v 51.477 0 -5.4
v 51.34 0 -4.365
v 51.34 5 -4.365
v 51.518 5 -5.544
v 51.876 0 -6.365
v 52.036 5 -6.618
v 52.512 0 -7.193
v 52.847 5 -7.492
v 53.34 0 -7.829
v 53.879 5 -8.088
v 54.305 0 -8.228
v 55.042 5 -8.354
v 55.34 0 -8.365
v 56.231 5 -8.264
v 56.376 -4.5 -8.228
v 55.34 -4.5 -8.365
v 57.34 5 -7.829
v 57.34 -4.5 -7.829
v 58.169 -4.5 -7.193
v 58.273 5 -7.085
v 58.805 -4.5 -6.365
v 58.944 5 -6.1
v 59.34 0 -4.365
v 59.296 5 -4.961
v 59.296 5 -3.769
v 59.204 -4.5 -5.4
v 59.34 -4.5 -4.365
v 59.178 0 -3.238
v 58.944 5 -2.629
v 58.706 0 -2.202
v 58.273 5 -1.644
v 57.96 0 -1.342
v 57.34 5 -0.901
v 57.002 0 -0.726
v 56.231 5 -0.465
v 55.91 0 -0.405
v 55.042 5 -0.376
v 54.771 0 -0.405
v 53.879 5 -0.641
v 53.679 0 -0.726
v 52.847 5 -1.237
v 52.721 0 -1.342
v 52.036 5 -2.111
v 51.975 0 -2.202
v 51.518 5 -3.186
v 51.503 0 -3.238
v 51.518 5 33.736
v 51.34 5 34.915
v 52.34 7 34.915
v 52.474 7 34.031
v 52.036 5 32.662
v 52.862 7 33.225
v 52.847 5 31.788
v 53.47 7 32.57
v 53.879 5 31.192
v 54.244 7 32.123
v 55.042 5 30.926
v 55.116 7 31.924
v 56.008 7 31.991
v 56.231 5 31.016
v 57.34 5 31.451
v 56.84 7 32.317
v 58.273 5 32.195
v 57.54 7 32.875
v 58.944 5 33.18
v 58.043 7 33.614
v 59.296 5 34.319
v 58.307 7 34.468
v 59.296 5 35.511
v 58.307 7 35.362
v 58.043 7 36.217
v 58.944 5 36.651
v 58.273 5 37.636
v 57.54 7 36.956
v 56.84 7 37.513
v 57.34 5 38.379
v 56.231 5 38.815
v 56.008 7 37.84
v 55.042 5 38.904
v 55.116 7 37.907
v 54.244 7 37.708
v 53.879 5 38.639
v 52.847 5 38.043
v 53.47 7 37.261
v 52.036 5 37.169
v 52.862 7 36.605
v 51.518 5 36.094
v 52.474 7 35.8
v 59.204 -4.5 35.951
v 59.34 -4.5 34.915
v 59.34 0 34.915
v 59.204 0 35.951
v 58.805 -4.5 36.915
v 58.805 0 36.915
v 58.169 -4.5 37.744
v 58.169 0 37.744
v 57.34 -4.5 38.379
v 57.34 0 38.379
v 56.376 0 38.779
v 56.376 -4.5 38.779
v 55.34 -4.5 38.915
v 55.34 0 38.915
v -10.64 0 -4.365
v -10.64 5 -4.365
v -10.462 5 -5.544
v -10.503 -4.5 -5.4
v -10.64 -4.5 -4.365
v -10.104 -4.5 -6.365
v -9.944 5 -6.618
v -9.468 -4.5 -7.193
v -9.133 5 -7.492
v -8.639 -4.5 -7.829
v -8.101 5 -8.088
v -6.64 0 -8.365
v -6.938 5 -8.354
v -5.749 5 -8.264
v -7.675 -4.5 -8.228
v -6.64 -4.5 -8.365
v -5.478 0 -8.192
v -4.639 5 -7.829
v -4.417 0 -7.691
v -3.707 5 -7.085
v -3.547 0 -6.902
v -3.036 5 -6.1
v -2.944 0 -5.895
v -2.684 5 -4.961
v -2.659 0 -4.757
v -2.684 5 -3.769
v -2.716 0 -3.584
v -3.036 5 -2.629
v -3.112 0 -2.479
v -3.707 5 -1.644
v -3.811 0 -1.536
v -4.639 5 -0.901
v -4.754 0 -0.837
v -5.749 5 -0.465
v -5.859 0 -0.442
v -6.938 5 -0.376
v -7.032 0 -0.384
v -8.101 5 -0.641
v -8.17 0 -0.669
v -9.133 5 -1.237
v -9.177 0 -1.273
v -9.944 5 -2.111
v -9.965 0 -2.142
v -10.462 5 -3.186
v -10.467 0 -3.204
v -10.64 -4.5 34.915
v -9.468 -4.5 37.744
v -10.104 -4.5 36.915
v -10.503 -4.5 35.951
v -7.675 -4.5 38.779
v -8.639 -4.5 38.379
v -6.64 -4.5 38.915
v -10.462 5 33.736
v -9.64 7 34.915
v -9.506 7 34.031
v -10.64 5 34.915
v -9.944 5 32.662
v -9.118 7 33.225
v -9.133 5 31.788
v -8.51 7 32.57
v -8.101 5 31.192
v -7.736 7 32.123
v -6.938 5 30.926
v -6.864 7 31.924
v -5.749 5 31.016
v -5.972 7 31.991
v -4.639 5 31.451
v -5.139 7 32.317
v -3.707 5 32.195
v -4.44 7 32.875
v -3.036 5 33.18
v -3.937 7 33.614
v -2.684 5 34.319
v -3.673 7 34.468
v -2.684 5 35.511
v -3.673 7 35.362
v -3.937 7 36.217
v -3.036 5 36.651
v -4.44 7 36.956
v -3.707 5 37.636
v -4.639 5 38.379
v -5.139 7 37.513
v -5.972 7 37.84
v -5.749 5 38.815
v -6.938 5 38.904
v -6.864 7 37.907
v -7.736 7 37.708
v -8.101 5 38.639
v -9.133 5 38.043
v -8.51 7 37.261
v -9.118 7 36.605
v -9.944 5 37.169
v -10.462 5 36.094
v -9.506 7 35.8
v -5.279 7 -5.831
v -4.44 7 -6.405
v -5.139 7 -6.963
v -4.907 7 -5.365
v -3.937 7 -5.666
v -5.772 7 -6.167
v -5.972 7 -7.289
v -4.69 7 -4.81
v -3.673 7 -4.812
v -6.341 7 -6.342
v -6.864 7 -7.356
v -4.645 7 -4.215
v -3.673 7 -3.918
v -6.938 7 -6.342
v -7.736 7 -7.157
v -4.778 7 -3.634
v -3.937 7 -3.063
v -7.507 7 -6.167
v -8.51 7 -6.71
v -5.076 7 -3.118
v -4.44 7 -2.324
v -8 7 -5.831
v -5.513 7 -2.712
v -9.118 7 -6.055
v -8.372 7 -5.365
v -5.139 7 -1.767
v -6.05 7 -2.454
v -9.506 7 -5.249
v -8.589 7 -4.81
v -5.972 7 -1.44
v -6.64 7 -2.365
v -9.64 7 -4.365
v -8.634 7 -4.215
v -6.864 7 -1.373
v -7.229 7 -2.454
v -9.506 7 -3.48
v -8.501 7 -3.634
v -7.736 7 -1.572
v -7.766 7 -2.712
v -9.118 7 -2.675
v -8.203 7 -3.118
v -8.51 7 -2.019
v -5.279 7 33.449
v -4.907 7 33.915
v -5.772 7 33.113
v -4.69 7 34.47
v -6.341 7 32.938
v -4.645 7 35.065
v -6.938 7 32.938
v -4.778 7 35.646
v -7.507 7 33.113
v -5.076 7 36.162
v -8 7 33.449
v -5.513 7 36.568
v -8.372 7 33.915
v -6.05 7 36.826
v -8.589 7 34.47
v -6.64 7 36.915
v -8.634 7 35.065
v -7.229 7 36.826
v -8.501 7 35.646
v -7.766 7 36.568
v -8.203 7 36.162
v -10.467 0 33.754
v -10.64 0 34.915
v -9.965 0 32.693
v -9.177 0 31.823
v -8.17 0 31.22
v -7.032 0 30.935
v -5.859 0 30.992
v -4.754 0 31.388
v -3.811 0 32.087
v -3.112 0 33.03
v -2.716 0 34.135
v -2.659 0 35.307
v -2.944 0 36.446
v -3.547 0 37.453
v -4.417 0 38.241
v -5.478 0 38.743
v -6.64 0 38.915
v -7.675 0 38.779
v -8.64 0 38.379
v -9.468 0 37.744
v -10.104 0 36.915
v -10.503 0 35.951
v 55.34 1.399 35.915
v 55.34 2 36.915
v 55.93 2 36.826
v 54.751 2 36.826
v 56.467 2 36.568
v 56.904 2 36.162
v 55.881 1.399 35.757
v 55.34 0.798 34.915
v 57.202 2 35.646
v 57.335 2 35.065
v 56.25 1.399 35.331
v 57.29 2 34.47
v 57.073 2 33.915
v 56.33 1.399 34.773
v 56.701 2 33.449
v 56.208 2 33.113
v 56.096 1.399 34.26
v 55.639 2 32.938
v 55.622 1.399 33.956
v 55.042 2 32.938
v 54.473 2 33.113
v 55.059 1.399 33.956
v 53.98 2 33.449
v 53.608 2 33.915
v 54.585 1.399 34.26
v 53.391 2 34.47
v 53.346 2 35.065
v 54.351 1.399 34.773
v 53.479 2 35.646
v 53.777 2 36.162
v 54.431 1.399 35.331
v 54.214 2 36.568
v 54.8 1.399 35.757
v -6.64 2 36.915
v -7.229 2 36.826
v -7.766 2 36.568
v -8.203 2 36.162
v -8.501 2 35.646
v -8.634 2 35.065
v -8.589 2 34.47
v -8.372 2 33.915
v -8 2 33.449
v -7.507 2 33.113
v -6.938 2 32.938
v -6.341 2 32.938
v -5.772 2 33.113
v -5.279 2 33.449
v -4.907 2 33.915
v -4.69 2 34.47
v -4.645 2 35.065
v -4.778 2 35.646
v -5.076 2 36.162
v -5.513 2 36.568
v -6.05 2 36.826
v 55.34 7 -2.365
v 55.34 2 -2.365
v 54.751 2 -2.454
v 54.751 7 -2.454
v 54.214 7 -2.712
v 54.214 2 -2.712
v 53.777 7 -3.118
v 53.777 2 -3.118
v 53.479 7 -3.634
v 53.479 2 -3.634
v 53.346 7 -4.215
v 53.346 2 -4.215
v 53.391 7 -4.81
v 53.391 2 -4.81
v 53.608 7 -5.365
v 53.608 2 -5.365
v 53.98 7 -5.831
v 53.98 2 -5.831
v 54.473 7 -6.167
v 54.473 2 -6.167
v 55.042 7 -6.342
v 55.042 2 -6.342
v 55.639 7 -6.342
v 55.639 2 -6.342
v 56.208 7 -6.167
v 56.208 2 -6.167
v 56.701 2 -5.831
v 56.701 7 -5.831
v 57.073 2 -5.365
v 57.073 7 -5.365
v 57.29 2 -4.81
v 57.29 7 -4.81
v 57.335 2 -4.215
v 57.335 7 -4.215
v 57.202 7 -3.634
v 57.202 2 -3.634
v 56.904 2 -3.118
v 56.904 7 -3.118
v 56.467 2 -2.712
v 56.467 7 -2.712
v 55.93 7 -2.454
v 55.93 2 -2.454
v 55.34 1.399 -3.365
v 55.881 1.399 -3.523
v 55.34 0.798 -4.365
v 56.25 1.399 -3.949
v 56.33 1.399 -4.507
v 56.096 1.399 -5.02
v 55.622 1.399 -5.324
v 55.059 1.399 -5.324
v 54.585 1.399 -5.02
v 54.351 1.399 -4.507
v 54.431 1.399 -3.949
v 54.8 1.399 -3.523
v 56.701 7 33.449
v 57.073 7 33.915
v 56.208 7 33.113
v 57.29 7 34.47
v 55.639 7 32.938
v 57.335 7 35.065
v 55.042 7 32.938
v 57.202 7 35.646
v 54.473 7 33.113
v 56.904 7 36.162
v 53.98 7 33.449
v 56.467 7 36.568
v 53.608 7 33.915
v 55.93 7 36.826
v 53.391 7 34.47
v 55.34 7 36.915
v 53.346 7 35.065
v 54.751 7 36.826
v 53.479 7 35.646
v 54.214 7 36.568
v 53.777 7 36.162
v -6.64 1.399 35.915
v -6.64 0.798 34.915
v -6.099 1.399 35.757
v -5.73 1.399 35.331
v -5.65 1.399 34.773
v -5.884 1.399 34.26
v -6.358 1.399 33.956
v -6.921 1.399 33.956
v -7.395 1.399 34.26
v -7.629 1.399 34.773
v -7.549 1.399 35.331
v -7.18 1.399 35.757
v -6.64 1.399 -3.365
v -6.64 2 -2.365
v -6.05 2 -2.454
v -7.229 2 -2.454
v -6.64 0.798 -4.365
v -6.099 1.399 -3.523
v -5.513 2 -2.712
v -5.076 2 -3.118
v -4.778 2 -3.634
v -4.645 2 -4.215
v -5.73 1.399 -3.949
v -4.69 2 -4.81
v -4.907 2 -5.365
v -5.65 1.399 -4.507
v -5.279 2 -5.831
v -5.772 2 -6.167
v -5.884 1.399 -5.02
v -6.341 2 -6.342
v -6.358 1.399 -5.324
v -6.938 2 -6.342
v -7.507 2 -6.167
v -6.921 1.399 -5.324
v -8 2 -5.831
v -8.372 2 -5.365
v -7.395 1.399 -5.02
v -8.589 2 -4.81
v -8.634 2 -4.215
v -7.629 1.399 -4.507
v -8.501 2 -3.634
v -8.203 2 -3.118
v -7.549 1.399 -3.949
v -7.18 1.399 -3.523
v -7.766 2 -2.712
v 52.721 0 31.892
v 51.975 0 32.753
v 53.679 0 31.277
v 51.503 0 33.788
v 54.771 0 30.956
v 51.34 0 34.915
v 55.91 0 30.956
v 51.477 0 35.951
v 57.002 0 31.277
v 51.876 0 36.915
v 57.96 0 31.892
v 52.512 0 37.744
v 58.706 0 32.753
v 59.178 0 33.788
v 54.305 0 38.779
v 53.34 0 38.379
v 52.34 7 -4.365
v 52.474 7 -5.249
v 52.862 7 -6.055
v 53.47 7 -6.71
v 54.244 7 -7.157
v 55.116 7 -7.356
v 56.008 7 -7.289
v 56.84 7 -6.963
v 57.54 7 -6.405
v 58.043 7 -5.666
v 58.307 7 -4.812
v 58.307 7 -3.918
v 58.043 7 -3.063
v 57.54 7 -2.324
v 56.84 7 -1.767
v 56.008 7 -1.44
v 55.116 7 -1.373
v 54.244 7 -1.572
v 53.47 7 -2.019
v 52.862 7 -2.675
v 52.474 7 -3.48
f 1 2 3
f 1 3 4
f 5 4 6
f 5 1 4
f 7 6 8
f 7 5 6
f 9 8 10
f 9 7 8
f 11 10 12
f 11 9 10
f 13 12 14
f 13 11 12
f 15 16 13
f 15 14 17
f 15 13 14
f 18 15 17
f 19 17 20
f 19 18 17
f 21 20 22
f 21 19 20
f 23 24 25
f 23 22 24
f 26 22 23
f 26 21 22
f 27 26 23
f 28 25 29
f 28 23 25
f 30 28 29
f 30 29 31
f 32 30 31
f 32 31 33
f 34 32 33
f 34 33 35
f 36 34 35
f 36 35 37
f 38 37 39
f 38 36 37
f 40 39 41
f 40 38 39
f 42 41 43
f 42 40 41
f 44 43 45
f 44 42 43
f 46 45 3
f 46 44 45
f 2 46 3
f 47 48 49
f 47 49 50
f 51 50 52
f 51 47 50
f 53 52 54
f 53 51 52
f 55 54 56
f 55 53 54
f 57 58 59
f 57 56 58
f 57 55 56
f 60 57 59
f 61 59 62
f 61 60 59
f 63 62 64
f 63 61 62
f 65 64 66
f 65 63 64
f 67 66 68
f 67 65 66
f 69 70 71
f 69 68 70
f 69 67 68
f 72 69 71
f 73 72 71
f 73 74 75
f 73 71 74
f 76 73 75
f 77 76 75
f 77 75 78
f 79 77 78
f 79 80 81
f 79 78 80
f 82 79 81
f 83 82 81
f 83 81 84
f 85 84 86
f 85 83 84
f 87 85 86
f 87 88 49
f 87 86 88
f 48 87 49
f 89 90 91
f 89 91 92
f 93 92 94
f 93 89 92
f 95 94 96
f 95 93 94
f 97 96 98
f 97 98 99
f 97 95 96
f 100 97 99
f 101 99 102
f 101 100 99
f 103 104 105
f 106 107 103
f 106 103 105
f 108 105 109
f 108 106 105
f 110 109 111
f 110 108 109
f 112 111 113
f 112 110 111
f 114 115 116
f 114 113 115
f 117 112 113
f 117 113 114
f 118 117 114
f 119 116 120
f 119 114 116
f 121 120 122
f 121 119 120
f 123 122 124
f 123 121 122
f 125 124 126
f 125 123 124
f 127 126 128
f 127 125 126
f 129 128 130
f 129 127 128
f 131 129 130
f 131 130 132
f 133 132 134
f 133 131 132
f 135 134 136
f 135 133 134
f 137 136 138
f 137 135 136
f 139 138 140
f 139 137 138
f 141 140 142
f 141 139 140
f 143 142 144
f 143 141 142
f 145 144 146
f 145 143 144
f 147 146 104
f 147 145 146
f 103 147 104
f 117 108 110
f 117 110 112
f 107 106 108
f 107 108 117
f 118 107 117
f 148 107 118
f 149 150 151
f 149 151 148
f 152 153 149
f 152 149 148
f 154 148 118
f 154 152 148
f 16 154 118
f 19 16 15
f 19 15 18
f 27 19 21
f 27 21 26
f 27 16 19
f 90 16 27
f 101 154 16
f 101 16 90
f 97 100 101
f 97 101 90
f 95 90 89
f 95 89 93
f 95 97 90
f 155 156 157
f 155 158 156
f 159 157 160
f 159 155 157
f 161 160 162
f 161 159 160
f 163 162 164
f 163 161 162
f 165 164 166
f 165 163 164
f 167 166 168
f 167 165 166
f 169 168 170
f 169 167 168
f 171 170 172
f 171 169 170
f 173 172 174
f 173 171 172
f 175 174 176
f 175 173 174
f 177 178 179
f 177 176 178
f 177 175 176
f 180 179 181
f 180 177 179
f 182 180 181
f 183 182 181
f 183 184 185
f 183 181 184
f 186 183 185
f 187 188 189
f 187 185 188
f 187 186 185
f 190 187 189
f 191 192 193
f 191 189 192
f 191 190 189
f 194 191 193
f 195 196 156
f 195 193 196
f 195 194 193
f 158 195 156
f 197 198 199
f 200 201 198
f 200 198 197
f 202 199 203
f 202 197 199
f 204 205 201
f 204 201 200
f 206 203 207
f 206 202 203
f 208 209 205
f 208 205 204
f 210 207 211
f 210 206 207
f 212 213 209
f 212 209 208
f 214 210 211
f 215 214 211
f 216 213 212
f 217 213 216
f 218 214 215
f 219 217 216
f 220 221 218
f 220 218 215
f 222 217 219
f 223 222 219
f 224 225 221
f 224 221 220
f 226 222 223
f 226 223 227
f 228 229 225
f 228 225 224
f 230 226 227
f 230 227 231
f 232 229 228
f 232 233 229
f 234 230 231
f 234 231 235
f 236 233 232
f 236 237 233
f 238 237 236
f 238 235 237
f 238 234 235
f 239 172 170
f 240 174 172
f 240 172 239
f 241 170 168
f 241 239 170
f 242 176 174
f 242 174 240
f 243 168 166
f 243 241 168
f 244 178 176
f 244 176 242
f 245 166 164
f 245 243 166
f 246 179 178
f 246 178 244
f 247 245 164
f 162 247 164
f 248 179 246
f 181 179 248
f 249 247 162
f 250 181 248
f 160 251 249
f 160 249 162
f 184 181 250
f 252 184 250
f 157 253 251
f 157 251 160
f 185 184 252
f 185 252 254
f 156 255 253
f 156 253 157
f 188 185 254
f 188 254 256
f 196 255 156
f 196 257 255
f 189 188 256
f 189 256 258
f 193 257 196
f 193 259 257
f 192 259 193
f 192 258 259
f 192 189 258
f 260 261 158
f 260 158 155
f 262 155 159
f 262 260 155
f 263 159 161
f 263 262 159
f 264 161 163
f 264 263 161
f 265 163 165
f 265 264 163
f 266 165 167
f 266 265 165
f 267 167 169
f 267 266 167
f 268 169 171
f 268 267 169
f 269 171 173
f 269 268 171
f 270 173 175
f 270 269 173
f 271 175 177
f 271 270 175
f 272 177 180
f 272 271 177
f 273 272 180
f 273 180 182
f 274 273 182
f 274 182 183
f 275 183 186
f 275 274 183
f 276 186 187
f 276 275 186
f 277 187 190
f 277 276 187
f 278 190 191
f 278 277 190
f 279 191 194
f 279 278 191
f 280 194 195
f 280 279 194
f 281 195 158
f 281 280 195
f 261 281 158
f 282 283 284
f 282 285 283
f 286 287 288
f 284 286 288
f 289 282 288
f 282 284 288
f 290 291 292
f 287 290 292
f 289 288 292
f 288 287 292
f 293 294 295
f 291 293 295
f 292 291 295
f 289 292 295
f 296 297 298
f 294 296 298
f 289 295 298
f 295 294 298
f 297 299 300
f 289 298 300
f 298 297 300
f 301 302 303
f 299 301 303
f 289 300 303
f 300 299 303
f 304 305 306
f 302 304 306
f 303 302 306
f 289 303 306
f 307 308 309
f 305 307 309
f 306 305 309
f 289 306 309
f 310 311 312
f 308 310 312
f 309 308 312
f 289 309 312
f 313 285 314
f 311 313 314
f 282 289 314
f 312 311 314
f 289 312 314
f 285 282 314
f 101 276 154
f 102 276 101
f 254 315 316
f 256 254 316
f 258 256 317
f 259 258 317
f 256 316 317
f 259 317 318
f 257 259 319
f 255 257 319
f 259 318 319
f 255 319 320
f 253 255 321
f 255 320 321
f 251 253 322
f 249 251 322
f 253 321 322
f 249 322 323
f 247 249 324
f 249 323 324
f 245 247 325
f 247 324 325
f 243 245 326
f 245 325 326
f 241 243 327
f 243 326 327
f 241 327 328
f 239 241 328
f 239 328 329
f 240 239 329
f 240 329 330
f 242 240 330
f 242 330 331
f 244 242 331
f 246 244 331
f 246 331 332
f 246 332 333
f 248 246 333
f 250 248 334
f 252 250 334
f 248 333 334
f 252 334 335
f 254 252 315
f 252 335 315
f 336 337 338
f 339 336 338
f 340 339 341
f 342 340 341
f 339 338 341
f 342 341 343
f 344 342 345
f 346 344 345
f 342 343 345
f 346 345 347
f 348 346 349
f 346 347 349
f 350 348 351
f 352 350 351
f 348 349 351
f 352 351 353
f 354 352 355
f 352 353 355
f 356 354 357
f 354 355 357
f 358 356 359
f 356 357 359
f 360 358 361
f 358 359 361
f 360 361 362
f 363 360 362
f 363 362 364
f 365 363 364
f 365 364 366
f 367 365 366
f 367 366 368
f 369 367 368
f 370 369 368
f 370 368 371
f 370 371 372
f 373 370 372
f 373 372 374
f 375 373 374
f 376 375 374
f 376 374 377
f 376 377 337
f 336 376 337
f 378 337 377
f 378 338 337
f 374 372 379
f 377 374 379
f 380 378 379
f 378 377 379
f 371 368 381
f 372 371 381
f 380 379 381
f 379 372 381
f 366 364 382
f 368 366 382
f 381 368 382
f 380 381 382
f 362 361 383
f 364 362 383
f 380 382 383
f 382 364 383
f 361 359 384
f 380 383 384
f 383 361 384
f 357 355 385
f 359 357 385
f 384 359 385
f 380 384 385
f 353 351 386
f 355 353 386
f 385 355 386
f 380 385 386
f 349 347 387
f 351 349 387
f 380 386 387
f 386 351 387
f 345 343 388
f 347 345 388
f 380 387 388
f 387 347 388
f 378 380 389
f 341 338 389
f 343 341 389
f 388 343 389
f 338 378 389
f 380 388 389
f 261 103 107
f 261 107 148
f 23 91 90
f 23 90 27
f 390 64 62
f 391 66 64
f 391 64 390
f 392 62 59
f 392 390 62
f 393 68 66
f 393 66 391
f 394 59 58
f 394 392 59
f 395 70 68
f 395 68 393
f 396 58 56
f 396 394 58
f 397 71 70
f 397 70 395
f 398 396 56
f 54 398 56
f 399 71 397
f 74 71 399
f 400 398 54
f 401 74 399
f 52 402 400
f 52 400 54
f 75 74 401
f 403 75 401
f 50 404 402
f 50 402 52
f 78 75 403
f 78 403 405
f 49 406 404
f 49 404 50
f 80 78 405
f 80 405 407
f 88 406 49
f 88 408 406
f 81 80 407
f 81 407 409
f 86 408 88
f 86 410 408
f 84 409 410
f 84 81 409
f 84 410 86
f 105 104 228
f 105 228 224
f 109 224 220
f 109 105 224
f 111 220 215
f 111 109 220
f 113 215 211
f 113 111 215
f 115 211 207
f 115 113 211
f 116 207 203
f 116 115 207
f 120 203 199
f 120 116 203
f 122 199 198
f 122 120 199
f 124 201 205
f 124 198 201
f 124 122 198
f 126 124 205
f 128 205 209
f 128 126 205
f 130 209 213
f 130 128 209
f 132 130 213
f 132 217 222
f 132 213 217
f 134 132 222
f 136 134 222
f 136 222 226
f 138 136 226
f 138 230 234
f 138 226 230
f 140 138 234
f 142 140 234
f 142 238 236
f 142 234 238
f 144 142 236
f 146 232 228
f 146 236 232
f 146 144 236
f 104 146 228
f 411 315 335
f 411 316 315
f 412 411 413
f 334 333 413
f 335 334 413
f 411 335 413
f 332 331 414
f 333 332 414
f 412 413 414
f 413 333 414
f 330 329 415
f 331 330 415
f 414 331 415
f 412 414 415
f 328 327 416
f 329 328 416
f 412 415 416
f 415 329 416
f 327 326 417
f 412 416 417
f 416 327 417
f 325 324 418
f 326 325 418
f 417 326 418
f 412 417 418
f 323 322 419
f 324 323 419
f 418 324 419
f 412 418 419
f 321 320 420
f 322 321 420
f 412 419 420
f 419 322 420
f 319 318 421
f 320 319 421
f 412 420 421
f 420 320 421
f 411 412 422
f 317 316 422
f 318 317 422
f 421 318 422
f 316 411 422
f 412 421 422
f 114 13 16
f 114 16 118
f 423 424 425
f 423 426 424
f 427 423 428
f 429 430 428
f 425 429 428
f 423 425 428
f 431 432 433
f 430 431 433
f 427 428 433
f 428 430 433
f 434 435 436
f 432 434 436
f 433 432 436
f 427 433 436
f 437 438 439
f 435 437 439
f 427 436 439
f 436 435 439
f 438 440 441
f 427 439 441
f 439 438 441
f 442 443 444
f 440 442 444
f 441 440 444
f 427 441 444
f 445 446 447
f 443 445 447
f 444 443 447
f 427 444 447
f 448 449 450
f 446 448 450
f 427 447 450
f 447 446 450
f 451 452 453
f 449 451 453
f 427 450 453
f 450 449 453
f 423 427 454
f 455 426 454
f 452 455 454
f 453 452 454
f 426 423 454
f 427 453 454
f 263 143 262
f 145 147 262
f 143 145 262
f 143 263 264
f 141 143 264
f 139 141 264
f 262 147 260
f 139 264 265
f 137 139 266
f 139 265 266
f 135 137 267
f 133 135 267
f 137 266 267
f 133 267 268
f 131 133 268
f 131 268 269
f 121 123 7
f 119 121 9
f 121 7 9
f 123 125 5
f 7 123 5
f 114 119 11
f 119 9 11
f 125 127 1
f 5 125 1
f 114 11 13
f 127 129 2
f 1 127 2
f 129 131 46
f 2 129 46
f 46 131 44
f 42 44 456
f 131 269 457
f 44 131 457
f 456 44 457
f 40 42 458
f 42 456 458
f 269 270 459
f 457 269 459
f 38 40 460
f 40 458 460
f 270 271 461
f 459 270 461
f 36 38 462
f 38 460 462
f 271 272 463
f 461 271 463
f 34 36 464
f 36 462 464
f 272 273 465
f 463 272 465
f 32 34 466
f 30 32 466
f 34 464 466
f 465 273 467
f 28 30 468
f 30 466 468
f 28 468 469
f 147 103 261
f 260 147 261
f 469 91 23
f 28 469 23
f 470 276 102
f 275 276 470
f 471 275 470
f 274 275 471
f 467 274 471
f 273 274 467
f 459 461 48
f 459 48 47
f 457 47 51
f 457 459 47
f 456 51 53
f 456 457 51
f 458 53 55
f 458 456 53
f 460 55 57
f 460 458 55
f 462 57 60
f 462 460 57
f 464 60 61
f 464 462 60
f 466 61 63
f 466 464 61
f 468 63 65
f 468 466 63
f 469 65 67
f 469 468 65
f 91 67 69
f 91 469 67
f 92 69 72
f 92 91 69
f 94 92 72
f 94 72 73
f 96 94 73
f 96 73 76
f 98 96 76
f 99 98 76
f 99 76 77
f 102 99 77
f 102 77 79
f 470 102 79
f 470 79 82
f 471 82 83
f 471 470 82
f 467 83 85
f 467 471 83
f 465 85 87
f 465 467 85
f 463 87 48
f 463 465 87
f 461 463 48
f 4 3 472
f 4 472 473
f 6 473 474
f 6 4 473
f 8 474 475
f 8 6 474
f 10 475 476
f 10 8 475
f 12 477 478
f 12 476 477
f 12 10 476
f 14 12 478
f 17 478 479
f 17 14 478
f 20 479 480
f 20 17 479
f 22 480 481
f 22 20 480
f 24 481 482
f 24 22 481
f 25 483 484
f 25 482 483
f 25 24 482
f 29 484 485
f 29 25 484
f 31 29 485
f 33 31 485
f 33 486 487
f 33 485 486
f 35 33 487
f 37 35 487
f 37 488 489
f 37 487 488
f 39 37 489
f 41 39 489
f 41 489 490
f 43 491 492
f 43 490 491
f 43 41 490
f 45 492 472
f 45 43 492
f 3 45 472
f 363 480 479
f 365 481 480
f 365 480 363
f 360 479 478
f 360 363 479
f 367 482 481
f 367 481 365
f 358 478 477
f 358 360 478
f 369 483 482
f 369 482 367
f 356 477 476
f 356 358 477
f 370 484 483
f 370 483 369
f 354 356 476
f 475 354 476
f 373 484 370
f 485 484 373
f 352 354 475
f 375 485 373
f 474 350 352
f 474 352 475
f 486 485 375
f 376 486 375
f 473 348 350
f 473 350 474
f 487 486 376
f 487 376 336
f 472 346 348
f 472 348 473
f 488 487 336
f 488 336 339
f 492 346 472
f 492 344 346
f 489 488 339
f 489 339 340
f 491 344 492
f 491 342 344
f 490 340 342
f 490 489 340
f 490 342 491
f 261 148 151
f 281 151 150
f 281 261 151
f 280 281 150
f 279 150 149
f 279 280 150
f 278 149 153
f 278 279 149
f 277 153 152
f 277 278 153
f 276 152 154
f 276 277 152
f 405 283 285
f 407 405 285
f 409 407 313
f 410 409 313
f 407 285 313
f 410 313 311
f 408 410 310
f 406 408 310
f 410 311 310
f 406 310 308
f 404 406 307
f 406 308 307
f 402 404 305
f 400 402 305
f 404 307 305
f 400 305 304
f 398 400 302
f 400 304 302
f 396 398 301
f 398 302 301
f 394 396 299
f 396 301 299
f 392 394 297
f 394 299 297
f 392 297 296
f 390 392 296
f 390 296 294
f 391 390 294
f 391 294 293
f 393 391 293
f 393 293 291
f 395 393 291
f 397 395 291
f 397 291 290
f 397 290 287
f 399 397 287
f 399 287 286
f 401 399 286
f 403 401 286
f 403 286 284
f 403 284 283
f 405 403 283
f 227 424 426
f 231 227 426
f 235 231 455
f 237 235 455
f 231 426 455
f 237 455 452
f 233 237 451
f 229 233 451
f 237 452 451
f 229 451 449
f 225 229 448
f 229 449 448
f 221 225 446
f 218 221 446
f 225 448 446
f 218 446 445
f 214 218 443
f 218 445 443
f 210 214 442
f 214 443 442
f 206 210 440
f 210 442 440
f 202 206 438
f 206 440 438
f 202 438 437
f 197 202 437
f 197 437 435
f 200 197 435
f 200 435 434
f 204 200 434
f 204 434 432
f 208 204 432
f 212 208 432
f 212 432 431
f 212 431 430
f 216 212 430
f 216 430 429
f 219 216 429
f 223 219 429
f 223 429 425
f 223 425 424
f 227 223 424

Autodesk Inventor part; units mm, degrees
ref_plane "YZ Plane" through (0, 0, 0) normal (1, 0, 0) x (0, 1, 0)
ref_plane "XZ Plane" through (0, 0, 0) normal (0, 1, 0) x (-1, 0, 0)
ref_plane "XY Plane" through (0, 0, 0) normal (0, 0, 1) x (1, 0, 0)
sketch "proto-board hole layout" plane through (0, 0, 0) normal (0, 1, 0) x (-1, 0, 0)
  circle A0 centre (6.6395, -4.3647) radius 1.49
  circle A1 centre (-55.3405, -4.3647) radius 1.49
  circle A2 centre (-55.3405, 34.9153) radius 1.49
  circle A3 centre (6.6395, 34.9153) radius 1.49
  line L0 (5.1495, -4.3647) -> (-53.8505, -4.3647) construction
  line L1 (5.1495, 34.9153) -> (-53.8505, 34.9153) construction
  line L2 (-55.3405, 33.4253) -> (-55.3405, -2.8747) construction
  line L3 (6.6395, 33.4253) -> (6.6395, -2.8747) construction
  dimension "d0" = 2.98
  dimension "d1" = 59
  dimension "d2" = 36.3
sketch "Sketch3" plane through (0, 0, 0) normal (0, 1, 0) x (-1, 0, 0)
  circle A0 centre (6.6395, -4.3647) radius 1.49 projected
  circle A1 centre (6.6395, -4.3647) radius 4
  point P0 (0, 0)
  dimension "d15" = 8
extrude "Extrusion2" add sketch "Sketch3" along normal blind 7 contours A0 | A1
sketch "Sketch4" plane through (-6.6395, 7, -4.3647) normal (0, 1, 0) x (1, 0, 0)
  circle A0 centre (0, 0) radius 4 construction
  point P0 (6.6395, -4.3647)
hole "Hole1" at (-6.6395, 7, -4.3647) direction (0, -1, 0) diameter 4 depth 5 tip angle 118
chamfer "Chamfer1" distance 1 distance2 2 1 edges at (-2.6395, 7, -4.3647) measured on face at (-9.9293, 7, -4.7642)
pattern_sketch "Sketch Driven Pattern1" from (-6.6395, 0, -4.3647) copies at (55.3405, 0, -4.3647) at (55.3405, 0, 34.9153) at (-6.6395, 0, 34.9153)
sketch "Sketch5" plane through (-6.6395, 0, 34.9153) normal (0, -1, 0) x (1, 0, 0)
  circle A0 centre (0, 0) radius 4 projected
  circle A1 centre (61.98, 0) radius 4 projected
  circle A2 centre (61.98, -39.28) radius 4 projected
  circle A3 centre (0, -39.28) radius 4 projected
  line L0 (-4, 4) -> (65.98, 4)
  line L1 (65.98, 4) -> (65.98, -43.28)
  line L2 (65.98, -43.28) -> (-4, -43.28)
  line L3 (-4, -43.28) -> (-4, 4)
  point P0 (6.6395, -34.9153)
  point P1 (-4, 0)
  point P2 (-4, -39.28)
  point P3 (0, -43.28)
  point P4 (61.98, -43.28)
  point P5 (65.98, -39.28)
  point P6 (65.98, 0)
  point P7 (61.98, 4)
  point P8 (0, 4)
extrude "Extrusion3" add sketch "Sketch5" along normal blind 4.5 contours A0 | A0 L0 A1 L1 A2 L2 A3 L3 | A1 | A3 | A2
properties part number "proto-board_standoffs_plate"
